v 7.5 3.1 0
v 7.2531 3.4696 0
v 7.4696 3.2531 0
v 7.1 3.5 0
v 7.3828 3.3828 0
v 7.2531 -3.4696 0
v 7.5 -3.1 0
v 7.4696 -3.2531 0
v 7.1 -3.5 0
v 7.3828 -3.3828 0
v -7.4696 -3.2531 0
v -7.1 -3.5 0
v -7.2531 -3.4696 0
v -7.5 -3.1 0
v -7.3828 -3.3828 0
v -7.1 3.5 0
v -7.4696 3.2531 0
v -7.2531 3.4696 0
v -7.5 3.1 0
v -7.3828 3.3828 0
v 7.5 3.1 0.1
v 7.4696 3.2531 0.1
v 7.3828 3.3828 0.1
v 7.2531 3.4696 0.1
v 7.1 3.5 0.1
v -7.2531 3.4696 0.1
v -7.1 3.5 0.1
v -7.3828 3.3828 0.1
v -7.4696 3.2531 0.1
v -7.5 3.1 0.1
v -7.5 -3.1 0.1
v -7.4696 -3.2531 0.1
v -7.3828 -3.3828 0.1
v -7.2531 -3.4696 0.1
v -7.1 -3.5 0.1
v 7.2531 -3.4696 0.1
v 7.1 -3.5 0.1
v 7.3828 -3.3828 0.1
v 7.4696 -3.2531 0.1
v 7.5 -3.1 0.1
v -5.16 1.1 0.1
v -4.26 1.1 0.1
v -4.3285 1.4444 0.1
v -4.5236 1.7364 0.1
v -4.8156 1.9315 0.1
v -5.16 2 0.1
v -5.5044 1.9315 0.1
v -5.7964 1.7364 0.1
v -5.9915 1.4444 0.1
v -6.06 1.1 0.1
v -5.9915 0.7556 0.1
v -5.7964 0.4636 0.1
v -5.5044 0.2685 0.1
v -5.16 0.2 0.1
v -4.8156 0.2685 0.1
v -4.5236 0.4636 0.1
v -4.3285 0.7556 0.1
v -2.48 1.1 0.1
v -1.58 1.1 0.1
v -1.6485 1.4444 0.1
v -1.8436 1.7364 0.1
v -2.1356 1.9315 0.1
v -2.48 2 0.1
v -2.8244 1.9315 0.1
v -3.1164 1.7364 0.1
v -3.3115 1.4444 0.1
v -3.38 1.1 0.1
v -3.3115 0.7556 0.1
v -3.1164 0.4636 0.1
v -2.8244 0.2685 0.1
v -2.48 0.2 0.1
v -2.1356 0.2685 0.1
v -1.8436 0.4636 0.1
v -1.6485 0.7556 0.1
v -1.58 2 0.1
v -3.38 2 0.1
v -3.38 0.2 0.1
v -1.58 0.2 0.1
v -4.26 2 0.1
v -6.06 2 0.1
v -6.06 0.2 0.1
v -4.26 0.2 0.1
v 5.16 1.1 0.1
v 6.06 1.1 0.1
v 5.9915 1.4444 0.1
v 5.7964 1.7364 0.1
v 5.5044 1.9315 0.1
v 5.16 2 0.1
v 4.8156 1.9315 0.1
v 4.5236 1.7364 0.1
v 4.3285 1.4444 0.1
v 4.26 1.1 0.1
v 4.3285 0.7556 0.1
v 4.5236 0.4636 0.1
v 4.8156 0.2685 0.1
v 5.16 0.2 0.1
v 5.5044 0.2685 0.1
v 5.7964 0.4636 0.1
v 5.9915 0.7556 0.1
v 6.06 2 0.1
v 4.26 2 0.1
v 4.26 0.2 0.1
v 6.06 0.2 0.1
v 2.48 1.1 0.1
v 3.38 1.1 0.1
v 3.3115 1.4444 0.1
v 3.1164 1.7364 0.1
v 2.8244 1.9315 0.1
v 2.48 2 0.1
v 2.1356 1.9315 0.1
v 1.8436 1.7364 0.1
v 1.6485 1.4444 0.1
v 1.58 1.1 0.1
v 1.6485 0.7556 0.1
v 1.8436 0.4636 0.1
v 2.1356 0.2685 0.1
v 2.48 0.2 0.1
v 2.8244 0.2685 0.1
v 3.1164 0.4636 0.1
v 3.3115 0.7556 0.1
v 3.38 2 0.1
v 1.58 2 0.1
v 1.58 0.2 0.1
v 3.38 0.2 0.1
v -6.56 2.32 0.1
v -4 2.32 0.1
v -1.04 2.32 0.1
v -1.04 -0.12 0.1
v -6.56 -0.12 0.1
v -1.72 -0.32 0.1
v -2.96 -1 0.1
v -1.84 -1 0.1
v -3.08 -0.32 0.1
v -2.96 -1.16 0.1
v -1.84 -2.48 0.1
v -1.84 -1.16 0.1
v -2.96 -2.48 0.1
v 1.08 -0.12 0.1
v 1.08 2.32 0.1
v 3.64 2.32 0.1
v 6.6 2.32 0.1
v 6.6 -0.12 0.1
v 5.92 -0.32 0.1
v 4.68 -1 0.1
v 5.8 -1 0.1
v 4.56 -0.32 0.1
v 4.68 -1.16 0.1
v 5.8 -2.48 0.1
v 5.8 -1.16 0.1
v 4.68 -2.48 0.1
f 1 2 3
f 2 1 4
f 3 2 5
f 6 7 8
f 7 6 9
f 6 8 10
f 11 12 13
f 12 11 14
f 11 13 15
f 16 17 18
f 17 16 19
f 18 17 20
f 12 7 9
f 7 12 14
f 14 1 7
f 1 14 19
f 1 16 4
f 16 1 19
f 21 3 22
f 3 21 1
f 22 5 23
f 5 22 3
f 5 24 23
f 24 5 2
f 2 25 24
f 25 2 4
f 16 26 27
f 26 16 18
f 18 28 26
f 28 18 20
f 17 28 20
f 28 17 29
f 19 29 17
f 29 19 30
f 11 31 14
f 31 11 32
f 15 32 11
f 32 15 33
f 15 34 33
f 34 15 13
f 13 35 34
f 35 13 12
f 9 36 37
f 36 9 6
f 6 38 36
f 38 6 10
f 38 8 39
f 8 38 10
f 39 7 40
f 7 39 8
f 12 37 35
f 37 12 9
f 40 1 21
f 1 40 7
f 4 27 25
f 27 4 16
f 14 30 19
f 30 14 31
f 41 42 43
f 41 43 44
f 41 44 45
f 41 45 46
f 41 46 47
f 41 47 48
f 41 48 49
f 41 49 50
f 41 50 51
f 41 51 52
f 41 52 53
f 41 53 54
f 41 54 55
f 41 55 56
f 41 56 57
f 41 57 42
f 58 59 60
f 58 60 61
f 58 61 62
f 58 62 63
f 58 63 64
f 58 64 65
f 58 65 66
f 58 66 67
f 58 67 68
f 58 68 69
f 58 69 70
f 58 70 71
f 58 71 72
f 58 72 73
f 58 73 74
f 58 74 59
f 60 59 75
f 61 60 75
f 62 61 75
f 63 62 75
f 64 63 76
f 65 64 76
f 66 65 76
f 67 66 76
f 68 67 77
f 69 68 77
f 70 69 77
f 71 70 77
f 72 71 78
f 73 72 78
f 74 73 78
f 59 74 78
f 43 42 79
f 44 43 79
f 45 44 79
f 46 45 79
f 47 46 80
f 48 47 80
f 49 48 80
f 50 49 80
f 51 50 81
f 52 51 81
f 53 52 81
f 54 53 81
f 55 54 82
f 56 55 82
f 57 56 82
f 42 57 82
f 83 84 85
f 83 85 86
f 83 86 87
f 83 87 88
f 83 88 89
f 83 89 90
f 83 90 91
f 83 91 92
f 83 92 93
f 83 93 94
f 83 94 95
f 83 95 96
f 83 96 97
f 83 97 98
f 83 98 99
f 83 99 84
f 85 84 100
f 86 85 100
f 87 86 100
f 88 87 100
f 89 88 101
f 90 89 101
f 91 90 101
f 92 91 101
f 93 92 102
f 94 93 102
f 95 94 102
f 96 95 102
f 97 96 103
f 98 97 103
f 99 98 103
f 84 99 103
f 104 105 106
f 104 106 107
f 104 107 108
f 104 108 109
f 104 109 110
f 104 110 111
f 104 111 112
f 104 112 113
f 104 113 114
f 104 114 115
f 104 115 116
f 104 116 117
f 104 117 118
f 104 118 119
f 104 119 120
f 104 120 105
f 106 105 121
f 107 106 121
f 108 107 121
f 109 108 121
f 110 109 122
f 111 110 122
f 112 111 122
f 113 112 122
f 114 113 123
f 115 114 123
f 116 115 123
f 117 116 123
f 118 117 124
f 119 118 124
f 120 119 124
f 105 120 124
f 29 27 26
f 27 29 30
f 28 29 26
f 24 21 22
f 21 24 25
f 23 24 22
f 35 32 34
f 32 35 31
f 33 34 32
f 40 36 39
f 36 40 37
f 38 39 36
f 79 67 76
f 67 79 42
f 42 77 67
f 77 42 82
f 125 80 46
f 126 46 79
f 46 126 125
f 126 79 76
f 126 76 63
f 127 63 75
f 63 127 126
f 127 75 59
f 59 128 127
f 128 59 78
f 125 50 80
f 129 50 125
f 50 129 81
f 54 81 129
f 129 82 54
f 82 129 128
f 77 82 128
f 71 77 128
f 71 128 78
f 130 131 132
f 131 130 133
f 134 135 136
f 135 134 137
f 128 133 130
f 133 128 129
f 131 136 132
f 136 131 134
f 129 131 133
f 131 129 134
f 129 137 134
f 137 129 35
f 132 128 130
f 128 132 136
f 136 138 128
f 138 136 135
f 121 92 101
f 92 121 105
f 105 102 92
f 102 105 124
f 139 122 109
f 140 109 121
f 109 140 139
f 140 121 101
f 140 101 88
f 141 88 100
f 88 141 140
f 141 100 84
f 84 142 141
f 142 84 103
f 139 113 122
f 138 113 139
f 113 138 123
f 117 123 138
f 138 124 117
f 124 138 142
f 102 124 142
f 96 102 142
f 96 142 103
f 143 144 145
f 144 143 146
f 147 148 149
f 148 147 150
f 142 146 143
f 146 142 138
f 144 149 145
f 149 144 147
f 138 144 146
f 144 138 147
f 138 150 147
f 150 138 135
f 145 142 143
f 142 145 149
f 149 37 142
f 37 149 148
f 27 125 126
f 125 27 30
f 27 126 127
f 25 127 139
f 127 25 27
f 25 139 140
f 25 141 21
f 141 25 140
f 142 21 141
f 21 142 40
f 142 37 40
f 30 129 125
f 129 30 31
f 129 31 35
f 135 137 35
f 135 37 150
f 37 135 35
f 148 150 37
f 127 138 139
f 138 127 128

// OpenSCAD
// file: ../p/4-4ndis.scad
use <../lib.scad>
function ldraw_lib__4_4ndis() = [
// 0 Disc Negative 1.0
// 0 Name: 4-4ndis.dat
// 0 Author: James Jessiman
// 0 !LDRAW_ORG Primitive UPDATE 2012-01
// 0 !LICENSE Licensed under CC BY 4.0 : see CAreadme.txt
// 
// 0 BFC CERTIFY CCW
  [0,"BFC","CERTIFY"],
  [0,"BFC","CCW"],
// 
// 0 !HISTORY 2002-03-23 [sbliss] Added BFC statement; compacted code
// 0 !HISTORY 2002-04-25 [PTadmin] Official Update 2002-02
// 0 !HISTORY 2007-06-24 [PTadmin] Header formatted for Contributor Agreement
// 0 !HISTORY 2008-07-01 [PTadmin] Official Update 2008-01
// 0 !HISTORY 2012-02-16 [Philo] Changed to CCW
// 0 !HISTORY 2012-03-30 [PTadmin] Official Update 2012-01
// 
// 
// 3 16 0.9239 0 0.3827 1 0 0 1 0 1
  [3,16,0.9239,0,0.3827,1,0,0,1,0,1],
// 3 16 0.7071 0 0.7071 0.9239 0 0.3827 1 0 1
  [3,16,0.7071,0,0.7071,0.9239,0,0.3827,1,0,1],
// 3 16 0.3827 0 0.9239 0.7071 0 0.7071 1 0 1
  [3,16,0.3827,0,0.9239,0.7071,0,0.7071,1,0,1],
// 3 16 0 0 1 0.3827 0 0.9239 1 0 1
  [3,16,0,0,1,0.3827,0,0.9239,1,0,1],
// 3 16 -0.3827 0 0.9239 0 0 1 -1 0 1
  [3,16,-0.3827,0,0.9239,0,0,1,-1,0,1],
// 3 16 -0.7071 0 0.7071 -0.3827 0 0.9239 -1 0 1
  [3,16,-0.7071,0,0.7071,-0.3827,0,0.9239,-1,0,1],
// 3 16 -0.9239 0 0.3827 -0.7071 0 0.7071 -1 0 1
  [3,16,-0.9239,0,0.3827,-0.7071,0,0.7071,-1,0,1],
// 3 16 -1 0 0 -0.9239 0 0.3827 -1 0 1
  [3,16,-1,0,0,-0.9239,0,0.3827,-1,0,1],
// 3 16 -0.9239 0 -0.3827 -1 0 0 -1 0 -1
  [3,16,-0.9239,0,-0.3827,-1,0,0,-1,0,-1],
// 3 16 -0.7071 0 -0.7071 -0.9239 0 -0.3827 -1 0 -1
  [3,16,-0.7071,0,-0.7071,-0.9239,0,-0.3827,-1,0,-1],
// 3 16 -0.3827 0 -0.9239 -0.7071 0 -0.7071 -1 0 -1
  [3,16,-0.3827,0,-0.9239,-0.7071,0,-0.7071,-1,0,-1],
// 3 16 0 0 -1 -0.3827 0 -0.9239 -1 0 -1
  [3,16,0,0,-1,-0.3827,0,-0.9239,-1,0,-1],
// 3 16 0.3827 0 -0.9239 0 0 -1 1 0 -1
  [3,16,0.3827,0,-0.9239,0,0,-1,1,0,-1],
// 3 16 0.7071 0 -0.7071 0.3827 0 -0.9239 1 0 -1
  [3,16,0.7071,0,-0.7071,0.3827,0,-0.9239,1,0,-1],
// 3 16 0.9239 0 -0.3827 0.7071 0 -0.7071 1 0 -1
  [3,16,0.9239,0,-0.3827,0.7071,0,-0.7071,1,0,-1],
// 3 16 1 0 0 0.9239 0 -0.3827 1 0 -1
  [3,16,1,0,0,0.9239,0,-0.3827,1,0,-1],
];
module ldraw_lib__4_4ndis(step=0, col=false, unit=2/5, alt=false, line=0.2, solid=!$preview)
    makepoly(ldraw_lib__4_4ndis(), step=step, col=col, unit=unit, alt=alt, line=line, solid=solid);
ldraw_lib__4_4ndis(line=0.2);
// file: ../p/4-4disc.scad
use <../lib.scad>
function ldraw_lib__4_4disc() = [
// 0 Disc 1.0
// 0 Name: 4-4disc.dat
// 0 Author: James Jessiman
// 0 !LDRAW_ORG Primitive UPDATE 2002-02
// 0 !LICENSE Licensed under CC BY 4.0 : see CAreadme.txt
// 
// 0 BFC CERTIFY CCW
  [0,"BFC","CERTIFY"],
  [0,"BFC","CCW"],
// 
// 0 !HISTORY 1998-12-15 [PTadmin] Official Update 1998-10
// 0 !HISTORY 2002-03-23 [sbliss] Added BFC statement
// 0 !HISTORY 2002-04-25 [PTadmin] Official Update 2002-02
// 0 !HISTORY 2007-06-24 [PTadmin] Header formatted for Contributor Agreement
// 0 !HISTORY 2008-07-01 [PTadmin] Official Update 2008-01
// 
// 
// 3 16 0 0 0 1 0 0 0.9239 0 0.3827
  [3,16,0,0,0,1,0,0,0.9239,0,0.3827],
// 3 16 0 0 0 0.9239 0 0.3827 0.7071 0 0.7071
  [3,16,0,0,0,0.9239,0,0.3827,0.7071,0,0.7071],
// 3 16 0 0 0 0.7071 0 0.7071 0.3827 0 0.9239
  [3,16,0,0,0,0.7071,0,0.7071,0.3827,0,0.9239],
// 3 16 0 0 0 0.3827 0 0.9239 0 0 1
  [3,16,0,0,0,0.3827,0,0.9239,0,0,1],
// 3 16 0 0 0 0 0 1 -0.3827 0 0.9239
  [3,16,0,0,0,0,0,1,-0.3827,0,0.9239],
// 3 16 0 0 0 -0.3827 0 0.9239 -0.7071 0 0.7071
  [3,16,0,0,0,-0.3827,0,0.9239,-0.7071,0,0.7071],
// 3 16 0 0 0 -0.7071 0 0.7071 -0.9239 0 0.3827
  [3,16,0,0,0,-0.7071,0,0.7071,-0.9239,0,0.3827],
// 3 16 0 0 0 -0.9239 0 0.3827 -1 0 -0
  [3,16,0,0,0,-0.9239,0,0.3827,-1,0,-0],
// 3 16 0 0 0 -1 0 -0 -0.9239 0 -0.3827
  [3,16,0,0,0,-1,0,-0,-0.9239,0,-0.3827],
// 3 16 0 0 0 -0.9239 0 -0.3827 -0.7071 0 -0.7071
  [3,16,0,0,0,-0.9239,0,-0.3827,-0.7071,0,-0.7071],
// 3 16 0 0 0 -0.7071 0 -0.7071 -0.3827 0 -0.9239
  [3,16,0,0,0,-0.7071,0,-0.7071,-0.3827,0,-0.9239],
// 3 16 0 0 0 -0.3827 0 -0.9239 0 0 -1
  [3,16,0,0,0,-0.3827,0,-0.9239,0,0,-1],
// 3 16 0 0 0 0 0 -1 0.3827 0 -0.9239
  [3,16,0,0,0,0,0,-1,0.3827,0,-0.9239],
// 3 16 0 0 0 0.3827 0 -0.9239 0.7071 0 -0.7071
  [3,16,0,0,0,0.3827,0,-0.9239,0.7071,0,-0.7071],
// 3 16 0 0 0 0.7071 0 -0.7071 0.9239 0 -0.3827
  [3,16,0,0,0,0.7071,0,-0.7071,0.9239,0,-0.3827],
// 3 16 0 0 0 0.9239 0 -0.3827 1 0 0
  [3,16,0,0,0,0.9239,0,-0.3827,1,0,0],
// 0
];
module ldraw_lib__4_4disc(step=0, col=false, unit=2/5, alt=false, line=0.2, solid=!$preview)
    makepoly(ldraw_lib__4_4disc(), step=step, col=col, unit=unit, alt=alt, line=line, solid=solid);
ldraw_lib__4_4disc(line=0.2);
// file: ../p/1-4cyli.scad
use <../lib.scad>
function ldraw_lib__1_4cyli() = [
// 0 Cylinder 0.25
// 0 Name: 1-4cyli.dat
// 0 Author: James Jessiman
// 0 !LDRAW_ORG Primitive UPDATE 2012-01
// 0 !LICENSE Licensed under CC BY 4.0 : see CAreadme.txt
// 
// 0 BFC CERTIFY CCW
  [0,"BFC","CERTIFY"],
  [0,"BFC","CCW"],
// 
// 0 !HISTORY 2002-03-23 [sbliss] Added BFC statement.
// 0 !HISTORY 2002-04-25 [PTadmin] Official Update 2002-02
// 0 !HISTORY 2007-06-22 [PTadmin] Header formatted for Contributor Agreement
// 0 !HISTORY 2008-07-01 [PTadmin] Official Update 2008-01
// 0 !HISTORY 2012-02-16 [Philo] Changed to CCW
// 0 !HISTORY 2012-03-30 [PTadmin] Official Update 2012-01
// 
// 
// 4 16 1 1 0 0.9239 1 0.3827 0.9239 0 0.3827 1 0 0
  [4,16,1,1,0,0.9239,1,0.3827,0.9239,0,0.3827,1,0,0],
// 5 24 1 0 0 1 1 0 0.9239 0 0.3827 1 0 -1
  [5,24,1,0,0,1,1,0,0.9239,0,0.3827,1,0,-1],
// 4 16 0.9239 1 0.3827 0.7071 1 0.7071 0.7071 0 0.7071 0.9239 0 0.3827
  [4,16,0.9239,1,0.3827,0.7071,1,0.7071,0.7071,0,0.7071,0.9239,0,0.3827],
// 5 24 0.9239 0 0.3827 0.9239 1 0.3827 0.7071 0 0.7071 1 0 0
  [5,24,0.9239,0,0.3827,0.9239,1,0.3827,0.7071,0,0.7071,1,0,0],
// 4 16 0.7071 1 0.7071 0.3827 1 0.9239 0.3827 0 0.9239 0.7071 0 0.7071
  [4,16,0.7071,1,0.7071,0.3827,1,0.9239,0.3827,0,0.9239,0.7071,0,0.7071],
// 5 24 0.7071 0 0.7071 0.7071 1 0.7071 0.3827 0 0.9239 0.9239 0 0.3827
  [5,24,0.7071,0,0.7071,0.7071,1,0.7071,0.3827,0,0.9239,0.9239,0,0.3827],
// 4 16 0.3827 1 0.9239 0 1 1 0 0 1 0.3827 0 0.9239
  [4,16,0.3827,1,0.9239,0,1,1,0,0,1,0.3827,0,0.9239],
// 5 24 0.3827 0 0.9239 0.3827 1 0.9239 0 0 1 0.7071 0 0.7071
  [5,24,0.3827,0,0.9239,0.3827,1,0.9239,0,0,1,0.7071,0,0.7071],
// 5 24 0 0 1 0 1 1 0.3827 0 0.9239 -1 0 1
  [5,24,0,0,1,0,1,1,0.3827,0,0.9239,-1,0,1],
];
module ldraw_lib__1_4cyli(step=0, col=false, unit=2/5, alt=false, line=0.2, solid=!$preview)
    makepoly(ldraw_lib__1_4cyli(), step=step, col=col, unit=unit, alt=alt, line=line, solid=solid);
ldraw_lib__1_4cyli(line=0.2);
// file: ../p/1-4chrd.scad
use <../lib.scad>
function ldraw_lib__1_4chrd() = [
// 0 Chord 0.25
// 0 Name: 1-4chrd.dat
// 0 Author: Max Martin Richter [MMR1988]
// 0 !LDRAW_ORG Primitive UPDATE 2023-05
// 0 !LICENSE Licensed under CC BY 4.0 : see CAreadme.txt
// 
// 0 BFC CERTIFY CCW
  [0,"BFC","CERTIFY"],
  [0,"BFC","CCW"],
// 
// 0 !HISTORY 2004-04-22 [PTadmin] Official Update 2004-02
// 0 !HISTORY 2007-10-09 [PTadmin] Header formatted for Contributor Agreement
// 0 !HISTORY 2008-07-01 [PTadmin] Official Update 2008-01
// 0 !HISTORY 2012-08-02 [MMR1988] Re-creation with PrimGen2 and Rectifier
// 0 !HISTORY 2012-08-09 [PTadmin] Official Update 2012-02
// 0 !HISTORY 2023-10-27 [OrionP] Change author to MMR1988 from hafhead
// 0 !HISTORY 2023-10-31 [OrionP] Official Update 2023-05
// 
// 4 16 0.9239 0 0.3827 0.3827 0 0.9239 0 0 1 1 0 0
  [4,16,0.9239,0,0.3827,0.3827,0,0.9239,0,0,1,1,0,0],
// 3 16 0.7071 0 0.7071 0.3827 0 0.9239 0.9239 0 0.3827
  [3,16,0.7071,0,0.7071,0.3827,0,0.9239,0.9239,0,0.3827],
];
module ldraw_lib__1_4chrd(step=0, col=false, unit=2/5, alt=false, line=0.2, solid=!$preview)
    makepoly(ldraw_lib__1_4chrd(), step=step, col=col, unit=unit, alt=alt, line=line, solid=solid);
ldraw_lib__1_4chrd(line=0.2);
// main file
use <../lib.scad>
use <../p/1-4chrd.scad>
use <../p/1-4cyli.scad>
use <../p/4-4disc.scad>
use <../p/4-4ndis.scad>
function ldraw_lib__4510086a() = [
// 0 Sticker  0.8 x  1.8 with Silver Controls and Blue and Red Dots
// 0 Name: 4510086a.dat
// 0 Author: Evert-Jan Boer [ejboer]
// 0 !LDRAW_ORG Part UPDATE 2025-04
// 0 !LICENSE Licensed under CC BY 4.0 : see CAreadme.txt
// 
// 0 BFC CERTIFY CCW
  [0,"BFC","CERTIFY"],
  [0,"BFC","CCW"],
// 
// 0 !KEYWORDS Millennium Falcon, Set 10179, Star Wars
// 
// 0 !HISTORY 2025-04-27 [OrionP] Official Update 2025-04
// 
// 1 16 17.75 0 7.75 1 0 0 0 -1 0 0 0 1 1-4chrd.dat
  [1,16,17.75,0,7.75,1,0,0,0,-1,0,0,0,1, ldraw_lib__1_4chrd()],
// 1 16 17.75 0 -7.75 0 0 1 0 -1 0 -1 0 0 1-4chrd.dat
  [1,16,17.75,0,-7.75,0,0,1,0,-1,0,-1,0,0, ldraw_lib__1_4chrd()],
// 1 16 -17.75 0 -7.75 -1 0 0 0 -1 0 0 0 -1 1-4chrd.dat
  [1,16,-17.75,0,-7.75,-1,0,0,0,-1,0,0,0,-1, ldraw_lib__1_4chrd()],
// 1 16 -17.75 0 7.75 0 0 -1 0 -1 0 1 0 0 1-4chrd.dat
  [1,16,-17.75,0,7.75,0,0,-1,0,-1,0,1,0,0, ldraw_lib__1_4chrd()],
// 4 16 17.75 0 -8.75 -17.75 0 -8.75 -18.75 0 -7.75 18.75 0 -7.75
  [4,16,17.75,0,-8.75,-17.75,0,-8.75,-18.75,0,-7.75,18.75,0,-7.75],
// 4 16 18.75 0 7.75 18.75 0 -7.75 -18.75 0 -7.75 -18.75 0 7.75
  [4,16,18.75,0,7.75,18.75,0,-7.75,-18.75,0,-7.75,-18.75,0,7.75],
// 4 16 18.75 0 7.75 -18.75 0 7.75 -17.75 0 8.75 17.75 0 8.75
  [4,16,18.75,0,7.75,-18.75,0,7.75,-17.75,0,8.75,17.75,0,8.75],
// 
// 1 16 17.75 -.25 7.75 1 0 0 0 .25 0 0 0 1 1-4cyli.dat
  [1,16,17.75,-.25,7.75,1,0,0,0,.25,0,0,0,1, ldraw_lib__1_4cyli()],
// 1 16 -17.75 -.25 7.75 0 0 -1 0 .25 0 1 0 0 1-4cyli.dat
  [1,16,-17.75,-.25,7.75,0,0,-1,0,.25,0,1,0,0, ldraw_lib__1_4cyli()],
// 1 16 -17.75 -.25 -7.75 -1 0 0 0 .25 0 0 0 -1 1-4cyli.dat
  [1,16,-17.75,-.25,-7.75,-1,0,0,0,.25,0,0,0,-1, ldraw_lib__1_4cyli()],
// 1 16 17.75 -.25 -7.75 0 0 1 0 .25 0 -1 0 0 1-4cyli.dat
  [1,16,17.75,-.25,-7.75,0,0,1,0,.25,0,-1,0,0, ldraw_lib__1_4cyli()],
// 4 16 17.75 -.25 -8.75 -17.75 -.25 -8.75 -17.75 0 -8.75 17.75 0 -8.75
  [4,16,17.75,-.25,-8.75,-17.75,-.25,-8.75,-17.75,0,-8.75,17.75,0,-8.75],
// 4 16 18.75 -.25 7.75 18.75 -.25 -7.75 18.75 0 -7.75 18.75 0 7.75
  [4,16,18.75,-.25,7.75,18.75,-.25,-7.75,18.75,0,-7.75,18.75,0,7.75],
// 4 16 -17.75 -.25 8.75 17.75 -.25 8.75 17.75 0 8.75 -17.75 0 8.75
  [4,16,-17.75,-.25,8.75,17.75,-.25,8.75,17.75,0,8.75,-17.75,0,8.75],
// 4 16 -18.75 -.25 -7.75 -18.75 -.25 7.75 -18.75 0 7.75 -18.75 0 -7.75
  [4,16,-18.75,-.25,-7.75,-18.75,-.25,7.75,-18.75,0,7.75,-18.75,0,-7.75],
// 
// 1 1 -12.9 -.25 2.75 2.25 0 0 0 1 0 0 0 2.25 4-4disc.dat
  [1,1,-12.9,-.25,2.75,2.25,0,0,0,1,0,0,0,2.25, ldraw_lib__4_4disc()],
// 1 4 -6.2 -.25 2.75 2.25 0 0 0 1 0 0 0 2.25 4-4disc.dat
  [1,4,-6.2,-.25,2.75,2.25,0,0,0,1,0,0,0,2.25, ldraw_lib__4_4disc()],
// 1 80 -6.2 -.25 2.75 2.25 0 0 0 1 0 0 0 2.25 4-4ndis.dat
  [1,80,-6.2,-.25,2.75,2.25,0,0,0,1,0,0,0,2.25, ldraw_lib__4_4ndis()],
// 1 80 -12.9 -.25 2.75 2.25 0 0 0 1 0 0 0 2.25 4-4ndis.dat
  [1,80,-12.9,-.25,2.75,2.25,0,0,0,1,0,0,0,2.25, ldraw_lib__4_4ndis()],
// 1 4 12.9 -.25 2.75 2.25 0 0 0 1 0 0 0 2.25 4-4disc.dat
  [1,4,12.9,-.25,2.75,2.25,0,0,0,1,0,0,0,2.25, ldraw_lib__4_4disc()],
// 1 80 12.9 -.25 2.75 2.25 0 0 0 1 0 0 0 2.25 4-4ndis.dat
  [1,80,12.9,-.25,2.75,2.25,0,0,0,1,0,0,0,2.25, ldraw_lib__4_4ndis()],
// 1 1 6.2 -.25 2.75 2.25 0 0 0 1 0 0 0 2.25 4-4disc.dat
  [1,1,6.2,-.25,2.75,2.25,0,0,0,1,0,0,0,2.25, ldraw_lib__4_4disc()],
// 1 80 6.2 -.25 2.75 2.25 0 0 0 1 0 0 0 2.25 4-4ndis.dat
  [1,80,6.2,-.25,2.75,2.25,0,0,0,1,0,0,0,2.25, ldraw_lib__4_4ndis()],
// 1 0 -17.75 -.25 7.75 0 0 -1 0 1 0 1 0 0 1-4chrd.dat
  [1,0,-17.75,-.25,7.75,0,0,-1,0,1,0,1,0,0, ldraw_lib__1_4chrd()],
// 1 0 17.75 -.25 7.75 1 0 0 0 1 0 0 0 1 1-4chrd.dat
  [1,0,17.75,-.25,7.75,1,0,0,0,1,0,0,0,1, ldraw_lib__1_4chrd()],
// 1 0 -17.75 -.25 -7.75 -1 0 0 0 1 0 0 0 -1 1-4chrd.dat
  [1,0,-17.75,-.25,-7.75,-1,0,0,0,1,0,0,0,-1, ldraw_lib__1_4chrd()],
// 1 0 17.75 -.25 -7.75 0 0 1 0 1 0 -1 0 0 1-4chrd.dat
  [1,0,17.75,-.25,-7.75,0,0,1,0,1,0,-1,0,0, ldraw_lib__1_4chrd()],
// 4 80 -8.45 -.25 2.75 -8.45 -.25 5 -10.65 -.25 5 -10.65 -.25 2.75
  [4,80,-8.45,-.25,2.75,-8.45,-.25,5,-10.65,-.25,5,-10.65,-.25,2.75],
// 4 80 -10.65 -.25 2.75 -10.65 -.25 .5 -8.45 -.25 .5 -8.45 -.25 2.75
  [4,80,-10.65,-.25,2.75,-10.65,-.25,.5,-8.45,-.25,.5,-8.45,-.25,2.75],
// 3 80 -16.4 -.25 5.8 -15.15 -.25 5 -12.9 -.25 5
  [3,80,-16.4,-.25,5.8,-15.15,-.25,5,-12.9,-.25,5],
// 4 80 -12.9 -.25 5 -10.65 -.25 5 -10 -.25 5.8 -16.4 -.25 5.8
  [4,80,-12.9,-.25,5,-10.65,-.25,5,-10,-.25,5.8,-16.4,-.25,5.8],
// 3 80 -10 -.25 5.8 -10.65 -.25 5 -8.45 -.25 5
  [3,80,-10,-.25,5.8,-10.65,-.25,5,-8.45,-.25,5],
// 3 80 -10 -.25 5.8 -8.45 -.25 5 -6.2 -.25 5
  [3,80,-10,-.25,5.8,-8.45,-.25,5,-6.2,-.25,5],
// 4 80 -6.2 -.25 5 -3.95 -.25 5 -2.6 -.25 5.8 -10 -.25 5.8
  [4,80,-6.2,-.25,5,-3.95,-.25,5,-2.6,-.25,5.8,-10,-.25,5.8],
// 3 80 -2.6 -.25 5.8 -3.95 -.25 5 -3.95 -.25 2.75
  [3,80,-2.6,-.25,5.8,-3.95,-.25,5,-3.95,-.25,2.75],
// 4 80 -3.95 -.25 2.75 -3.95 -.25 .5 -2.6 -.25 -.3 -2.6 -.25 5.8
  [4,80,-3.95,-.25,2.75,-3.95,-.25,.5,-2.6,-.25,-.3,-2.6,-.25,5.8],
// 3 80 -16.4 -.25 5.8 -15.15 -.25 2.75 -15.15 -.25 5
  [3,80,-16.4,-.25,5.8,-15.15,-.25,2.75,-15.15,-.25,5],
// 4 80 -16.4 -.25 -.3 -15.15 -.25 .5 -15.15 -.25 2.75 -16.4 -.25 5.8
  [4,80,-16.4,-.25,-.3,-15.15,-.25,.5,-15.15,-.25,2.75,-16.4,-.25,5.8],
// 3 80 -12.9 -.25 .5 -15.15 -.25 .5 -16.4 -.25 -.3
  [3,80,-12.9,-.25,.5,-15.15,-.25,.5,-16.4,-.25,-.3],
// 4 80 -2.6 -.25 -.3 -10.65 -.25 .5 -12.9 -.25 .5 -16.4 -.25 -.3
  [4,80,-2.6,-.25,-.3,-10.65,-.25,.5,-12.9,-.25,.5,-16.4,-.25,-.3],
// 3 80 -8.45 -.25 .5 -10.65 -.25 .5 -2.6 -.25 -.3
  [3,80,-8.45,-.25,.5,-10.65,-.25,.5,-2.6,-.25,-.3],
// 3 80 -6.2 -.25 .5 -8.45 -.25 .5 -2.6 -.25 -.3
  [3,80,-6.2,-.25,.5,-8.45,-.25,.5,-2.6,-.25,-.3],
// 3 80 -6.2 -.25 .5 -2.6 -.25 -.3 -3.95 -.25 .5
  [3,80,-6.2,-.25,.5,-2.6,-.25,-.3,-3.95,-.25,.5],
// 4 80 -7.4 -.25 -2.5 -4.6 -.25 -2.5 -4.3 -.25 -.8 -7.7 -.25 -.8
  [4,80,-7.4,-.25,-2.5,-4.6,-.25,-2.5,-4.3,-.25,-.8,-7.7,-.25,-.8],
// 4 80 -4.6 -.25 -6.2 -4.6 -.25 -2.9 -7.4 -.25 -2.9 -7.4 -.25 -6.2
  [4,80,-4.6,-.25,-6.2,-4.6,-.25,-2.9,-7.4,-.25,-2.9,-7.4,-.25,-6.2],
// 4 0 -7.7 -.25 -.8 -4.3 -.25 -.8 -2.6 -.25 -.3 -16.4 -.25 -.3
  [4,0,-7.7,-.25,-.8,-4.3,-.25,-.8,-2.6,-.25,-.3,-16.4,-.25,-.3],
// 4 0 -4.6 -.25 -2.9 -4.6 -.25 -2.5 -7.4 -.25 -2.5 -7.4 -.25 -2.9
  [4,0,-4.6,-.25,-2.9,-4.6,-.25,-2.5,-7.4,-.25,-2.5,-7.4,-.25,-2.9],
// 4 0 -7.4 -.25 -2.9 -7.4 -.25 -2.5 -7.7 -.25 -.8 -16.4 -.25 -.3
  [4,0,-7.4,-.25,-2.9,-7.4,-.25,-2.5,-7.7,-.25,-.8,-16.4,-.25,-.3],
// 4 0 -17.75 -.25 -8.75 -7.4 -.25 -6.2 -7.4 -.25 -2.9 -16.4 -.25 -.3
  [4,0,-17.75,-.25,-8.75,-7.4,-.25,-6.2,-7.4,-.25,-2.9,-16.4,-.25,-.3],
// 4 0 -4.3 -.25 -.8 -4.6 -.25 -2.5 -4.6 -.25 -2.9 -2.6 -.25 -.3
  [4,0,-4.3,-.25,-.8,-4.6,-.25,-2.5,-4.6,-.25,-2.9,-2.6,-.25,-.3],
// 4 0 2.7 -.25 -.3 -2.6 -.25 -.3 -4.6 -.25 -2.9 -4.6 -.25 -6.2
  [4,0,2.7,-.25,-.3,-2.6,-.25,-.3,-4.6,-.25,-2.9,-4.6,-.25,-6.2],
// 4 80 10.65 -.25 2.75 10.65 -.25 5 8.45 -.25 5 8.45 -.25 2.75
  [4,80,10.65,-.25,2.75,10.65,-.25,5,8.45,-.25,5,8.45,-.25,2.75],
// 4 80 10.65 -.25 .5 10.65 -.25 2.75 8.45 -.25 2.75 8.45 -.25 .5
  [4,80,10.65,-.25,.5,10.65,-.25,2.75,8.45,-.25,2.75,8.45,-.25,.5],
// 3 80 2.7 -.25 5.8 3.95 -.25 5 6.2 -.25 5
  [3,80,2.7,-.25,5.8,3.95,-.25,5,6.2,-.25,5],
// 4 80 6.2 -.25 5 8.45 -.25 5 9.1 -.25 5.8 2.7 -.25 5.8
  [4,80,6.2,-.25,5,8.45,-.25,5,9.1,-.25,5.8,2.7,-.25,5.8],
// 3 80 9.1 -.25 5.8 8.45 -.25 5 10.65 -.25 5
  [3,80,9.1,-.25,5.8,8.45,-.25,5,10.65,-.25,5],
// 3 80 9.1 -.25 5.8 10.65 -.25 5 12.9 -.25 5
  [3,80,9.1,-.25,5.8,10.65,-.25,5,12.9,-.25,5],
// 4 80 12.9 -.25 5 15.15 -.25 5 16.5 -.25 5.8 9.1 -.25 5.8
  [4,80,12.9,-.25,5,15.15,-.25,5,16.5,-.25,5.8,9.1,-.25,5.8],
// 3 80 16.5 -.25 5.8 15.15 -.25 5 15.15 -.25 2.75
  [3,80,16.5,-.25,5.8,15.15,-.25,5,15.15,-.25,2.75],
// 4 80 16.5 -.25 -.3 16.5 -.25 5.8 15.15 -.25 2.75 15.15 -.25 .5
  [4,80,16.5,-.25,-.3,16.5,-.25,5.8,15.15,-.25,2.75,15.15,-.25,.5],
// 3 80 2.7 -.25 5.8 3.95 -.25 2.75 3.95 -.25 5
  [3,80,2.7,-.25,5.8,3.95,-.25,2.75,3.95,-.25,5],
// 4 80 3.95 -.25 2.75 2.7 -.25 5.8 2.7 -.25 -.3 3.95 -.25 .5
  [4,80,3.95,-.25,2.75,2.7,-.25,5.8,2.7,-.25,-.3,3.95,-.25,.5],
// 3 80 6.2 -.25 .5 3.95 -.25 .5 2.7 -.25 -.3
  [3,80,6.2,-.25,.5,3.95,-.25,.5,2.7,-.25,-.3],
// 4 80 6.2 -.25 .5 2.7 -.25 -.3 16.5 -.25 -.3 8.45 -.25 .5
  [4,80,6.2,-.25,.5,2.7,-.25,-.3,16.5,-.25,-.3,8.45,-.25,.5],
// 3 80 10.65 -.25 .5 8.45 -.25 .5 16.5 -.25 -.3
  [3,80,10.65,-.25,.5,8.45,-.25,.5,16.5,-.25,-.3],
// 3 80 12.9 -.25 .5 10.65 -.25 .5 16.5 -.25 -.3
  [3,80,12.9,-.25,.5,10.65,-.25,.5,16.5,-.25,-.3],
// 3 80 12.9 -.25 .5 16.5 -.25 -.3 15.15 -.25 .5
  [3,80,12.9,-.25,.5,16.5,-.25,-.3,15.15,-.25,.5],
// 4 80 11.7 -.25 -2.5 14.5 -.25 -2.5 14.8 -.25 -.8 11.4 -.25 -.8
  [4,80,11.7,-.25,-2.5,14.5,-.25,-2.5,14.8,-.25,-.8,11.4,-.25,-.8],
// 4 80 11.7 -.25 -2.9 11.7 -.25 -6.2 14.5 -.25 -6.2 14.5 -.25 -2.9
  [4,80,11.7,-.25,-2.9,11.7,-.25,-6.2,14.5,-.25,-6.2,14.5,-.25,-2.9],
// 4 0 11.4 -.25 -.8 14.8 -.25 -.8 16.5 -.25 -.3 2.7 -.25 -.3
  [4,0,11.4,-.25,-.8,14.8,-.25,-.8,16.5,-.25,-.3,2.7,-.25,-.3],
// 4 0 11.7 -.25 -2.5 11.7 -.25 -2.9 14.5 -.25 -2.9 14.5 -.25 -2.5
  [4,0,11.7,-.25,-2.5,11.7,-.25,-2.9,14.5,-.25,-2.9,14.5,-.25,-2.5],
// 4 0 11.4 -.25 -.8 2.7 -.25 -.3 11.7 -.25 -2.9 11.7 -.25 -2.5
  [4,0,11.4,-.25,-.8,2.7,-.25,-.3,11.7,-.25,-2.9,11.7,-.25,-2.5],
// 4 0 -4.6 -.25 -6.2 11.7 -.25 -6.2 11.7 -.25 -2.9 2.7 -.25 -.3
  [4,0,-4.6,-.25,-6.2,11.7,-.25,-6.2,11.7,-.25,-2.9,2.7,-.25,-.3],
// 4 0 14.5 -.25 -2.9 16.5 -.25 -.3 14.8 -.25 -.8 14.5 -.25 -2.5
  [4,0,14.5,-.25,-2.9,16.5,-.25,-.3,14.8,-.25,-.8,14.5,-.25,-2.5],
// 4 0 17.75 -.25 -8.75 16.5 -.25 -.3 14.5 -.25 -2.9 14.5 -.25 -6.2
  [4,0,17.75,-.25,-8.75,16.5,-.25,-.3,14.5,-.25,-2.9,14.5,-.25,-6.2],
// 4 0 -18.75 -.25 7.75 -16.4 -.25 5.8 -10 -.25 5.8 -17.75 -.25 8.75
  [4,0,-18.75,-.25,7.75,-16.4,-.25,5.8,-10,-.25,5.8,-17.75,-.25,8.75],
// 3 0 -17.75 -.25 8.75 -10 -.25 5.8 -2.6 -.25 5.8
  [3,0,-17.75,-.25,8.75,-10,-.25,5.8,-2.6,-.25,5.8],
// 4 0 -2.6 -.25 5.8 2.7 -.25 5.8 17.75 -.25 8.75 -17.75 -.25 8.75
  [4,0,-2.6,-.25,5.8,2.7,-.25,5.8,17.75,-.25,8.75,-17.75,-.25,8.75],
// 3 0 17.75 -.25 8.75 2.7 -.25 5.8 9.1 -.25 5.8
  [3,0,17.75,-.25,8.75,2.7,-.25,5.8,9.1,-.25,5.8],
// 4 0 18.75 -.25 7.75 17.75 -.25 8.75 9.1 -.25 5.8 16.5 -.25 5.8
  [4,0,18.75,-.25,7.75,17.75,-.25,8.75,9.1,-.25,5.8,16.5,-.25,5.8],
// 4 0 16.5 -.25 5.8 16.5 -.25 -.3 18.75 -.25 -7.75 18.75 -.25 7.75
  [4,0,16.5,-.25,5.8,16.5,-.25,-.3,18.75,-.25,-7.75,18.75,-.25,7.75],
// 3 0 16.5 -.25 -.3 17.75 -.25 -8.75 18.75 -.25 -7.75
  [3,0,16.5,-.25,-.3,17.75,-.25,-8.75,18.75,-.25,-7.75],
// 4 0 -16.4 -.25 5.8 -18.75 -.25 7.75 -18.75 -.25 -7.75 -16.4 -.25 -.3
  [4,0,-16.4,-.25,5.8,-18.75,-.25,7.75,-18.75,-.25,-7.75,-16.4,-.25,-.3],
// 3 0 -16.4 -.25 -.3 -18.75 -.25 -7.75 -17.75 -.25 -8.75
  [3,0,-16.4,-.25,-.3,-18.75,-.25,-7.75,-17.75,-.25,-8.75],
// 3 0 -4.6 -.25 -6.2 -7.4 -.25 -6.2 -17.75 -.25 -8.75
  [3,0,-4.6,-.25,-6.2,-7.4,-.25,-6.2,-17.75,-.25,-8.75],
// 4 0 17.75 -.25 -8.75 11.7 -.25 -6.2 -4.6 -.25 -6.2 -17.75 -.25 -8.75
  [4,0,17.75,-.25,-8.75,11.7,-.25,-6.2,-4.6,-.25,-6.2,-17.75,-.25,-8.75],
// 3 0 14.5 -.25 -6.2 11.7 -.25 -6.2 17.75 -.25 -8.75
  [3,0,14.5,-.25,-6.2,11.7,-.25,-6.2,17.75,-.25,-8.75],
// 4 0 -2.6 -.25 5.8 -2.6 -.25 -.3 2.7 -.25 -.3 2.7 -.25 5.8
  [4,0,-2.6,-.25,5.8,-2.6,-.25,-.3,2.7,-.25,-.3,2.7,-.25,5.8],
];
module ldraw_lib__4510086a(step=0, col=false, unit=2/5, alt=false, line=0.2, solid=!$preview)
    makepoly(ldraw_lib__4510086a(), step=step, col=col, unit=unit, alt=alt, line=line, solid=solid);
ldraw_lib__4510086a(line=0.2);
